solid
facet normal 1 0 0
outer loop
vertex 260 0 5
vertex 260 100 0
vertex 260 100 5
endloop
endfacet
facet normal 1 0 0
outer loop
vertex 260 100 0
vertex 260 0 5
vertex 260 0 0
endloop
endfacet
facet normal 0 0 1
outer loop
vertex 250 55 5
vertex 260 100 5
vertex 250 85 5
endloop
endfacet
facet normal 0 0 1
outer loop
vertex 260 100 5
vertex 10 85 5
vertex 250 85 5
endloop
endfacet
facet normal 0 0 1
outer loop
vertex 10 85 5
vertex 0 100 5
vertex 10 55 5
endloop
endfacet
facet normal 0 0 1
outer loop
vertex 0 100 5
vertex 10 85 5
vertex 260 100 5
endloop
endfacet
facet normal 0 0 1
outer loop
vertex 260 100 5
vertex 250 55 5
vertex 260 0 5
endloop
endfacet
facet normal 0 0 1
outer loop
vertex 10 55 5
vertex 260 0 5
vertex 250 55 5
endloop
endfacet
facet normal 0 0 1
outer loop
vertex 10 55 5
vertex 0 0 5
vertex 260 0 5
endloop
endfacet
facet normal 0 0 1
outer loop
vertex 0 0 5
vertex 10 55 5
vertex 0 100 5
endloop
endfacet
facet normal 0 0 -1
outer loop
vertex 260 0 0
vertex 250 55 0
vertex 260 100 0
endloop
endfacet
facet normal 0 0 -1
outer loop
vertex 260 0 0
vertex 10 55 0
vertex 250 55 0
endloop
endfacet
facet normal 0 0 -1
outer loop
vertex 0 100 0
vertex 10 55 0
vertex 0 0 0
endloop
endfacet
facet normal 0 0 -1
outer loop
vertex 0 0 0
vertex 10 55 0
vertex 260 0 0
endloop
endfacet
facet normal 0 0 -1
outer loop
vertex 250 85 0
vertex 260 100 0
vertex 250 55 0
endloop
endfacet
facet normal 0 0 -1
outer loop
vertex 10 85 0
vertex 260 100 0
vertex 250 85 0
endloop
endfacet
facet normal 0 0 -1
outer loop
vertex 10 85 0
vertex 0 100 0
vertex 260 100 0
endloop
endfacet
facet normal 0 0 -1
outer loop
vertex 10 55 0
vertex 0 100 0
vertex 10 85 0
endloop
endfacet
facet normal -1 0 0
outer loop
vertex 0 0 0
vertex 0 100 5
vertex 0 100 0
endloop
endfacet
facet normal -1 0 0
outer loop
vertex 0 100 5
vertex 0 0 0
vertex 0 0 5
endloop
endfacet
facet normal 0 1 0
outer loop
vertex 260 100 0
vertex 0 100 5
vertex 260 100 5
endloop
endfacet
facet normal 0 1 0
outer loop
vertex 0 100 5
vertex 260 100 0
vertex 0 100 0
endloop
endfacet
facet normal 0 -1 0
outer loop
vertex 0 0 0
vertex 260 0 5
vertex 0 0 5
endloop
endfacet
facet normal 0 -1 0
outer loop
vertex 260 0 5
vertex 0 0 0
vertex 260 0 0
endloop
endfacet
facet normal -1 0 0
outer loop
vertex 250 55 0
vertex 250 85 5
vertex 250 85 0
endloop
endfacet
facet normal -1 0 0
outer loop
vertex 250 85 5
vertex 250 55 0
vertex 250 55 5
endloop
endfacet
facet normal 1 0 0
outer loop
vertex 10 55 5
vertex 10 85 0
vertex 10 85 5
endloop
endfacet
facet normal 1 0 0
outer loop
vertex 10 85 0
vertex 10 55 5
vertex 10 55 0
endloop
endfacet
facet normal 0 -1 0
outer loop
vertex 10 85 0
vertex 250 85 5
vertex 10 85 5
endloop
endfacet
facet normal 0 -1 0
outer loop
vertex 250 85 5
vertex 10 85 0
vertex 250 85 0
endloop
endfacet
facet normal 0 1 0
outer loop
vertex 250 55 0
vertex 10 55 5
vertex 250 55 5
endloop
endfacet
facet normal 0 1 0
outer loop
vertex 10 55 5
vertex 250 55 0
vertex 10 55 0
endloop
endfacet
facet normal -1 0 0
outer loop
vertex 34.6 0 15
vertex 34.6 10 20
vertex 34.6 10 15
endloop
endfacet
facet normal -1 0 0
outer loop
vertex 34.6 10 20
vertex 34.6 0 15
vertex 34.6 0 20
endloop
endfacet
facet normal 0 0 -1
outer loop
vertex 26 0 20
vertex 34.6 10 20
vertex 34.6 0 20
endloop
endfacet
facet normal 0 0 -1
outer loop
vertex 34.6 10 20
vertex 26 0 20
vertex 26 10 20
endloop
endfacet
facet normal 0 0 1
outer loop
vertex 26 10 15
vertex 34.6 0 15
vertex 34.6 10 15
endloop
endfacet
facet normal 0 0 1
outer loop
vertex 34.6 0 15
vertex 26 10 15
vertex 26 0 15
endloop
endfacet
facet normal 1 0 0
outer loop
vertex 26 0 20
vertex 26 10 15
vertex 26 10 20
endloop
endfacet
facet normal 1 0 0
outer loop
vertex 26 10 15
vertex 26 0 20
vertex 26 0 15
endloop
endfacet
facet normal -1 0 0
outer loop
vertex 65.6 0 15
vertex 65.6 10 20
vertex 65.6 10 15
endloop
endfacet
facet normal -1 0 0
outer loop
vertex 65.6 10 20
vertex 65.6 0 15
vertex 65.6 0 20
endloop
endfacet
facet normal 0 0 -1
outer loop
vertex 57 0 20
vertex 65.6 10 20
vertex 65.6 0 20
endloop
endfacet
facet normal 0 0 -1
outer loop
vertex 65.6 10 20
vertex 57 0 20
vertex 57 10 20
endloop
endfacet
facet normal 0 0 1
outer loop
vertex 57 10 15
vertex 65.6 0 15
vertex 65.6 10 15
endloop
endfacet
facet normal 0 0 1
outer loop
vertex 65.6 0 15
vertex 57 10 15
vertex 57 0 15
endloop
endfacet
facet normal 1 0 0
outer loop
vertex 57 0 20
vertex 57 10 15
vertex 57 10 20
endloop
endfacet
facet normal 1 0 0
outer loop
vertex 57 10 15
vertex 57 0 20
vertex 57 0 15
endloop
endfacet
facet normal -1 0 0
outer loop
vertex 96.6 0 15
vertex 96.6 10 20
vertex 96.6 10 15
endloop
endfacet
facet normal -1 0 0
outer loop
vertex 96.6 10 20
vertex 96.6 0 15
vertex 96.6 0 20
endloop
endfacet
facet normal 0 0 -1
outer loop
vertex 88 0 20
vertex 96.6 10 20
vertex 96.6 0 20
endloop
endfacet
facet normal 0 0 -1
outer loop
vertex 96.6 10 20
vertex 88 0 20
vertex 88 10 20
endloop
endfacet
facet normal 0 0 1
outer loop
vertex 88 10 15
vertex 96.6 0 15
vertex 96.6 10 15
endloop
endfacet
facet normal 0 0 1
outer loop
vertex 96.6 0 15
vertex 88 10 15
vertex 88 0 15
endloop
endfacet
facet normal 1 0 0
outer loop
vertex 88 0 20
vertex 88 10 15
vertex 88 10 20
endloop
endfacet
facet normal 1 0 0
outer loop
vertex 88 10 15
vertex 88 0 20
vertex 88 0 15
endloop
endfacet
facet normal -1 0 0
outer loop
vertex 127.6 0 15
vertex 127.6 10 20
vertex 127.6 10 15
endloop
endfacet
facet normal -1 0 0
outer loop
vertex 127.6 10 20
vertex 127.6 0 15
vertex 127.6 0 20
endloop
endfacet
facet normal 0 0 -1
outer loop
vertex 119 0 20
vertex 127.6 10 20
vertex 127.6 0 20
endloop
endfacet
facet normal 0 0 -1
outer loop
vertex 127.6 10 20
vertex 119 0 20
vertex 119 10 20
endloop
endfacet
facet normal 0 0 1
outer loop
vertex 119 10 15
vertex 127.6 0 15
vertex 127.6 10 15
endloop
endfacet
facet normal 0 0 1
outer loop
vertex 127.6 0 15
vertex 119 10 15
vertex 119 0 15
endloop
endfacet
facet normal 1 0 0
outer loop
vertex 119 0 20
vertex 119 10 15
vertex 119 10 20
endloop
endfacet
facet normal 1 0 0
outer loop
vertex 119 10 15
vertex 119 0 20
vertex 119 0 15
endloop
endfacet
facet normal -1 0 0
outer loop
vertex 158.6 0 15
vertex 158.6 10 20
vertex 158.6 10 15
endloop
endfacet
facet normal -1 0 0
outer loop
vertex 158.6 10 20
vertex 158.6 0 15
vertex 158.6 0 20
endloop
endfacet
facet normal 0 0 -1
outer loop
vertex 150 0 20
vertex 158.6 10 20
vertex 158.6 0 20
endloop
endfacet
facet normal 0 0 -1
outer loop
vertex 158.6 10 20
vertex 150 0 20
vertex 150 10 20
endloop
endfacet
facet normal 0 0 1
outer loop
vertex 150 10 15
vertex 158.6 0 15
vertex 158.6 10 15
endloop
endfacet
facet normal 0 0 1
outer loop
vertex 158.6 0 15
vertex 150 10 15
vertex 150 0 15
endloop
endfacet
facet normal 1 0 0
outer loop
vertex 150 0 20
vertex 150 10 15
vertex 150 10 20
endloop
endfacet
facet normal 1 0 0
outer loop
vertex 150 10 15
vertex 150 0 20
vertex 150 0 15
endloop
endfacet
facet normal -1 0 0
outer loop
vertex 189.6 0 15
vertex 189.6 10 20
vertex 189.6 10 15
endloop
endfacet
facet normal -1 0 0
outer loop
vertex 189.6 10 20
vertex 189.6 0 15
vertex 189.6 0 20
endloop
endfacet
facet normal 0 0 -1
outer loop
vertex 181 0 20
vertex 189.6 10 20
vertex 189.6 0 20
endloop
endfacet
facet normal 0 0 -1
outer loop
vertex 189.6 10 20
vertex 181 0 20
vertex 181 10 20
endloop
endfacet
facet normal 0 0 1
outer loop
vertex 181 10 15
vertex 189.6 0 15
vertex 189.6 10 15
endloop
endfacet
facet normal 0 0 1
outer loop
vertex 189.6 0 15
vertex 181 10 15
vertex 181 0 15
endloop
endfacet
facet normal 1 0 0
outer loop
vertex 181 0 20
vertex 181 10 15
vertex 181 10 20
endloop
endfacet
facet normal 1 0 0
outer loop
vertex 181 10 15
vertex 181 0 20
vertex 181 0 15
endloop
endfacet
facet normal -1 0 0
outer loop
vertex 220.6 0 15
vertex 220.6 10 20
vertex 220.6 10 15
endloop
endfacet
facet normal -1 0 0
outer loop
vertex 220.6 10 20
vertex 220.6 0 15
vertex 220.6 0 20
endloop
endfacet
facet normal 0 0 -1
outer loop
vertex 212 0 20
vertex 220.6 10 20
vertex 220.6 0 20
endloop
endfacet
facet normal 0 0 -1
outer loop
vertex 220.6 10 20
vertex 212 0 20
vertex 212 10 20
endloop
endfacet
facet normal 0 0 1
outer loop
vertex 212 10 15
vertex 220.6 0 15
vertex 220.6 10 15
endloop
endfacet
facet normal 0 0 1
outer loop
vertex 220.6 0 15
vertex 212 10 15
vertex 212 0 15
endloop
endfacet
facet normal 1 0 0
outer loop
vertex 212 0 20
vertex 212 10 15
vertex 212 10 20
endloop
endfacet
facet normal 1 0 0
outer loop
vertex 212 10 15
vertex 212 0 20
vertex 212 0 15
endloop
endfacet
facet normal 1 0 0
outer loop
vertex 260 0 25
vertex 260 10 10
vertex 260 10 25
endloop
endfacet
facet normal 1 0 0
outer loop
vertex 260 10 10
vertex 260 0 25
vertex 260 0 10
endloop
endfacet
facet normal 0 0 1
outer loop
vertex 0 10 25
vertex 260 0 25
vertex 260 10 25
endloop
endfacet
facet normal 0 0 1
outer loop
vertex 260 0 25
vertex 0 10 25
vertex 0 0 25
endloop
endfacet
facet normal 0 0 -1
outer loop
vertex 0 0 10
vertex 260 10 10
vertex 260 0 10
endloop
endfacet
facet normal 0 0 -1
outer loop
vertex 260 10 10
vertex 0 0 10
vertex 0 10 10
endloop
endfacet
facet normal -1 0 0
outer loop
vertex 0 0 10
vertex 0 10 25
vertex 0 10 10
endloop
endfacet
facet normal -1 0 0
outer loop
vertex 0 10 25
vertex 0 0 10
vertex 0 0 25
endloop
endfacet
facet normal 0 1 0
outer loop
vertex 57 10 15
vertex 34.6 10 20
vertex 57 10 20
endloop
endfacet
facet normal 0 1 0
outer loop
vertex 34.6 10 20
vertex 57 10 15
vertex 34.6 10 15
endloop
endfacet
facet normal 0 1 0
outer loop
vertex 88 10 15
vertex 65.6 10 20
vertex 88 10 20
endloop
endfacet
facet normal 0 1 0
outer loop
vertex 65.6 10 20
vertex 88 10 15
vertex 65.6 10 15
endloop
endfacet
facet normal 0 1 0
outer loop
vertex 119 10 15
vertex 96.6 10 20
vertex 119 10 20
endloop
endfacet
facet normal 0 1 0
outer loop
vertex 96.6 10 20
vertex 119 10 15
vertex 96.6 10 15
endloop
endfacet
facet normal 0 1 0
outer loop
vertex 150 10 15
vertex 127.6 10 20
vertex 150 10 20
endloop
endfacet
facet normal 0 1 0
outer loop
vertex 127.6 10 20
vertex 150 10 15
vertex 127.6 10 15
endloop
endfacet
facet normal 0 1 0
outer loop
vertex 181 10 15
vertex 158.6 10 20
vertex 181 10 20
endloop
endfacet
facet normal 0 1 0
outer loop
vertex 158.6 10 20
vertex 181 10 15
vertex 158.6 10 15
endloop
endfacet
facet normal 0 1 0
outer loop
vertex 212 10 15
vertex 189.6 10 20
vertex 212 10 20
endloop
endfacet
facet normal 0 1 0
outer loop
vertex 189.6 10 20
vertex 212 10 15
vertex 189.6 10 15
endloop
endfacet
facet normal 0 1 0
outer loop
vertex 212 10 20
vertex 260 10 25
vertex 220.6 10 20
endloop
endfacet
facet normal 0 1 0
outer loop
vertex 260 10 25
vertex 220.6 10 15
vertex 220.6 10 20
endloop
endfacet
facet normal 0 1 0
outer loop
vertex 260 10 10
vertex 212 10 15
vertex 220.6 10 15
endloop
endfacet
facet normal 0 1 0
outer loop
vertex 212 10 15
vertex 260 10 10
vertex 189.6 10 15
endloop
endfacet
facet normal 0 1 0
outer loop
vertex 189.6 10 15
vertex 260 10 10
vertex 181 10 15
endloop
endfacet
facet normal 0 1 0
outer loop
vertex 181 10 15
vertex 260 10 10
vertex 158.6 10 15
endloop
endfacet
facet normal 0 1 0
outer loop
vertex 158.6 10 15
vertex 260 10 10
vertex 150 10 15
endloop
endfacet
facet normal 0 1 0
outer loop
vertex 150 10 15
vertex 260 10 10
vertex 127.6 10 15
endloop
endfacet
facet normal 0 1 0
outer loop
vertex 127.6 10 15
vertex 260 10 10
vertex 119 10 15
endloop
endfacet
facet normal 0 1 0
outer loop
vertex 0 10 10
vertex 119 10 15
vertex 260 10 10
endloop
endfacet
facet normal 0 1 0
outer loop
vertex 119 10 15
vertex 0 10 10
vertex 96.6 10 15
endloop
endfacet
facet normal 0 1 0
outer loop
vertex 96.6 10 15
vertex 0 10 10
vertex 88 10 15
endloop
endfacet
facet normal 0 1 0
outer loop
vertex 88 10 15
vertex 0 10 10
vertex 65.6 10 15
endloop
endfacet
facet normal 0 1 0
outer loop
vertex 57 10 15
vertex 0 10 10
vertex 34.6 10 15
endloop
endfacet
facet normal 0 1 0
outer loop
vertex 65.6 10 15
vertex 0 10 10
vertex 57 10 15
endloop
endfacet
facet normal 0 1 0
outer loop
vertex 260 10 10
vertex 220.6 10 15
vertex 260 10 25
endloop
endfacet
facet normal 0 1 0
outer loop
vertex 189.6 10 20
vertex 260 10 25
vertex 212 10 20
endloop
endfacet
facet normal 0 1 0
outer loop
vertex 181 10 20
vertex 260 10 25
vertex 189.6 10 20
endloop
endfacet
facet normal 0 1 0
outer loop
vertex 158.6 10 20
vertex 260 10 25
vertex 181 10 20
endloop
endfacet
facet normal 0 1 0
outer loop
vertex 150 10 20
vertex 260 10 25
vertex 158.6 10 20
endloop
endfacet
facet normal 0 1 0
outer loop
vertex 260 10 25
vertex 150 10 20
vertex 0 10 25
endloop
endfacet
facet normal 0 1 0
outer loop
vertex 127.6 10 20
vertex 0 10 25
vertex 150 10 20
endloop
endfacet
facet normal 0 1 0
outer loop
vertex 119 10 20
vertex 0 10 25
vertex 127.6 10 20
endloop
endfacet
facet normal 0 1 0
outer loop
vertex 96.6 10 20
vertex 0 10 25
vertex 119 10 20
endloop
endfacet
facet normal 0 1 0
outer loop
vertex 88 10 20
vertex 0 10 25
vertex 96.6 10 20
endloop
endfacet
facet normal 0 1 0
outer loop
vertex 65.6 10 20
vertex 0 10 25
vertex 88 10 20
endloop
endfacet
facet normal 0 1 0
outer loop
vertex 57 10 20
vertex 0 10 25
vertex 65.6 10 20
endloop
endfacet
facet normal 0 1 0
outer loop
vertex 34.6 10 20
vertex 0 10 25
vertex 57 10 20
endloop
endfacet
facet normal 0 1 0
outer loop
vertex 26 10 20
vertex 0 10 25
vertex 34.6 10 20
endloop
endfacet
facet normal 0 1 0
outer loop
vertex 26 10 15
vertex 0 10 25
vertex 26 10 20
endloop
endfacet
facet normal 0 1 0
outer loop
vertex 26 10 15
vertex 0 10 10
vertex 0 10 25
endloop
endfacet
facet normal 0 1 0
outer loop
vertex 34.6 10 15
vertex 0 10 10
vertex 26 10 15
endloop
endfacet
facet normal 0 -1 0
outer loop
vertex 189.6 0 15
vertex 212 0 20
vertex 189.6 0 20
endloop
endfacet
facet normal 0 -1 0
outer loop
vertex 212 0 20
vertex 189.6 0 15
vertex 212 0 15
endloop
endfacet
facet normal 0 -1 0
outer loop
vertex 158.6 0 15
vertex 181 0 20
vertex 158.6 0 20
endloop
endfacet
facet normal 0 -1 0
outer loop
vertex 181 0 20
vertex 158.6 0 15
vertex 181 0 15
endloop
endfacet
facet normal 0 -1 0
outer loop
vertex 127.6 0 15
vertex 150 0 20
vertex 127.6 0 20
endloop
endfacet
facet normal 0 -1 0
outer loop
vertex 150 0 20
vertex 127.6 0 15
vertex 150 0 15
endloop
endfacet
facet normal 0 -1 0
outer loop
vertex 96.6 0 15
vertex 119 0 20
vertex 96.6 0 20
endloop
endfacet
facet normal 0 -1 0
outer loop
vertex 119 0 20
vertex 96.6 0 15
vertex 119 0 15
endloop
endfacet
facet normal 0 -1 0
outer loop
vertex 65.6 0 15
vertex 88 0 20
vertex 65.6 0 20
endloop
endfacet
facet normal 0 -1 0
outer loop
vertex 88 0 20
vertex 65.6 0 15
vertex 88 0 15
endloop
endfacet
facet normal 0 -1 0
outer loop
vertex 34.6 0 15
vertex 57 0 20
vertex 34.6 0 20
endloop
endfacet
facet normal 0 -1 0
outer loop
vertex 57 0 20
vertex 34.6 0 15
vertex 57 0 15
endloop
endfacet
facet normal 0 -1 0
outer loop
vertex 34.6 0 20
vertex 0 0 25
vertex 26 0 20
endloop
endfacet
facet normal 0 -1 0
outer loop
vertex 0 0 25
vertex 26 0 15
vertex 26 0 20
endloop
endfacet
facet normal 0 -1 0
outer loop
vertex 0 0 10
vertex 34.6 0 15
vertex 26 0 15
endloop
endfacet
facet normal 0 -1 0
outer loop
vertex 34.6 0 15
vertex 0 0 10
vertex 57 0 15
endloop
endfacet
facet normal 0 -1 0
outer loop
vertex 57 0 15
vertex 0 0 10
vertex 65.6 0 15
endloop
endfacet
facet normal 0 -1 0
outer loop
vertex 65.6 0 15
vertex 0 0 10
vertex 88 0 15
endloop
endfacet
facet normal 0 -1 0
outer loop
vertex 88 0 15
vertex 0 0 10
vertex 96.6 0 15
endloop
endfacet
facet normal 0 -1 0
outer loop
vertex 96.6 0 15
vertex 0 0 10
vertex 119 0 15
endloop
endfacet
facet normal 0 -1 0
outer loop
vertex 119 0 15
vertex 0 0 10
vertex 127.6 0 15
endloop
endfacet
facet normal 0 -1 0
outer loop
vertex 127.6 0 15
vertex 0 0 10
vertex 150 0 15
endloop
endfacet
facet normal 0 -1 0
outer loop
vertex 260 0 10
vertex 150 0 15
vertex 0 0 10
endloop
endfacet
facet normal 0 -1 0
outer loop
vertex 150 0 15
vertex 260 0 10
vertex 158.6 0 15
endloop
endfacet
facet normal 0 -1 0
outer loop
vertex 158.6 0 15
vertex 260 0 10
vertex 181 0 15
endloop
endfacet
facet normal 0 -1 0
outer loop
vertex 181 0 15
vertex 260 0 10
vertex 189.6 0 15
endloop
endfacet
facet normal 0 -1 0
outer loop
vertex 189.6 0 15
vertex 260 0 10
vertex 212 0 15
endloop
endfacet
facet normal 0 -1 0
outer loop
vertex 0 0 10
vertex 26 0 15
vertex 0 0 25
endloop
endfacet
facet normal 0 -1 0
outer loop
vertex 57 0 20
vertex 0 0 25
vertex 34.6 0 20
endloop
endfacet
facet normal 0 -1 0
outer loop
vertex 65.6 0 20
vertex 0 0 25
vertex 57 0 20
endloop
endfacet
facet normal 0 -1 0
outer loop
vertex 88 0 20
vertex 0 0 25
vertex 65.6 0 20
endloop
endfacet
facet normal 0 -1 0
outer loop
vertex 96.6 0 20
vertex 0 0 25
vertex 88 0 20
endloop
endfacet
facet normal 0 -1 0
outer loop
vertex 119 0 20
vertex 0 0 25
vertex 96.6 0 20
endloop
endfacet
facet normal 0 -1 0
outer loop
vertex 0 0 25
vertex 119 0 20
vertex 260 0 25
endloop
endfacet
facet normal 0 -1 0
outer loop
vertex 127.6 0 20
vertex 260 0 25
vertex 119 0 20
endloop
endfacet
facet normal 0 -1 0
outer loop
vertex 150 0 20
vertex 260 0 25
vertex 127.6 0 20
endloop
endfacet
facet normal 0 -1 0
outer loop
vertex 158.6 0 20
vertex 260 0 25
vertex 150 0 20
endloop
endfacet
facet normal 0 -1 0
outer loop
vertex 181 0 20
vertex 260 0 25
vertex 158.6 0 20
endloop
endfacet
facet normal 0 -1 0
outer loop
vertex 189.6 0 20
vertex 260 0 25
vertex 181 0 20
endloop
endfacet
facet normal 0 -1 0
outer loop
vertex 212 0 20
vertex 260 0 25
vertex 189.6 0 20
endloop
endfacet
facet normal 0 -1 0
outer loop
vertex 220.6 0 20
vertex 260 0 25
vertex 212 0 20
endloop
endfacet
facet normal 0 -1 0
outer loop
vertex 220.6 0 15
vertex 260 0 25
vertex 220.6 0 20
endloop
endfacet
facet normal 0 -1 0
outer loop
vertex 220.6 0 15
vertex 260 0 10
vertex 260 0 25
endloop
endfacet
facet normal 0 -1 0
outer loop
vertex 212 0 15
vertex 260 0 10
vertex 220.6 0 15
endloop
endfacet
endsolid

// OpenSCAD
/*
 * WAVE OCEAN MECHANISM - PRINT PARTS
 *
 * Set PART_SELECT to export individual parts for printing
 */

// PART SELECTION
// 0 = Assembly view (not for printing)
// 1 = Frame base
// 2 = Slot rail
// 3 = Left side wall
// 4 = Right side wall
// 5 = Left bearing block
// 6 = Right bearing block
// 7 = Top beam
// 8 = Camshaft (print horizontally)
// 9 = Cam 1 (smallest)
// 10 = Cam 2
// 11 = Cam 3
// 12 = Cam 4 (medium)
// 13 = Cam 5
// 14 = Cam 6
// 15 = Cam 7 (largest)
// 16 = Wave segment (print 7x)
// 17 = Belt pulley
// 18 = Hand crank
PART_SELECT = 0;

// ============================================
// PARAMETERS (same as main file)
// ============================================

WAVE_AREA_START = 78;
NUM_WAVES = 7;
PHASE_OFFSET = 360 / NUM_WAVES;

WAVE_WIDTH = 36;
WAVE_OVERLAP = 5;
WAVE_SPACING = WAVE_WIDTH - WAVE_OVERLAP;
WAVE_LENGTH = 70;
WAVE_THICKNESS = 3;

TAB_WIDTH = 8;
TAB_HEIGHT = 4;

CAMSHAFT_DIA = 8;
CAMSHAFT_LENGTH = 250;
CAMSHAFT_HOLE = 8.6;
CAMSHAFT_Y = 60;
CAMSHAFT_Z = 20;

CAM_PROFILES = [
    [6, 3, 2],
    [7, 3.5, 2],
    [8, 4, 2.5],
    [10, 5, 2.5],
    [12, 6, 3],
    [14, 7, 3],
    [16, 8, 3]
];

SLOT_LENGTHS = [3, 4, 5, 6, 7, 8, 10];

FRAME_WIDTH = 260;
FRAME_DEPTH = 100;
FRAME_HEIGHT = 60;
FRAME_WALL = 5;
FRAME_X = WAVE_AREA_START - 10;
FRAME_Y = -10;
FRAME_Z = 0;

SLOT_RAIL_HEIGHT = 15;
SLOT_RAIL_Y = 0;
SLOT_RAIL_Z = 10;

BEARING_BLOCK_SIZE = 20;

CRANK_ARM_LENGTH = 35;
CRANK_KNOB_DIA = 15;
CRANK_KNOB_HEIGHT = 25;

PULLEY_OD = 30;
PULLEY_WIDTH = 8;

$fn = 64;

function wave_x(i) = WAVE_AREA_START + 20 + i * WAVE_SPACING;

// ============================================
// PRINT-ORIENTED MODULES
// ============================================

// Frame base - print flat
module print_frame_base() {
    difference() {
        cube([FRAME_WIDTH, FRAME_DEPTH, FRAME_WALL]);
        // Cutout for camshaft clearance
        translate([10, CAMSHAFT_Y - FRAME_Y - 15, -1])
            cube([FRAME_WIDTH - 20, 30, FRAME_WALL + 2]);
    }
}

// Slot rail - print flat
module print_slot_rail() {
    difference() {
        cube([FRAME_WIDTH, FRAME_WALL + 5, SLOT_RAIL_HEIGHT]);
        // Horizontal slots
        for (i = [0:NUM_WAVES-1]) {
            slot_x = wave_x(i) - FRAME_X - TAB_WIDTH/2;
            translate([slot_x, -1, SLOT_RAIL_HEIGHT/2 - TAB_HEIGHT/2 - 0.5])
                cube([TAB_WIDTH + 0.6, FRAME_WALL + 7, TAB_HEIGHT + 1]);
        }
    }
}

// Side wall - print flat
module print_side_wall() {
    cube([FRAME_WALL, FRAME_DEPTH, FRAME_HEIGHT]);
}

// Bearing block - print flat
module print_bearing_block() {
    difference() {
        cube([FRAME_WALL + 5, BEARING_BLOCK_SIZE, BEARING_BLOCK_SIZE]);
        translate([-1, BEARING_BLOCK_SIZE/2, BEARING_BLOCK_SIZE/2])
            rotate([0, 90, 0])
                cylinder(d=CAMSHAFT_HOLE, h=FRAME_WALL + 7);
    }
}

// Top beam - print flat
module print_top_beam() {
    cube([FRAME_WIDTH, 15, FRAME_WALL]);
}

// Camshaft - print horizontally
module print_camshaft() {
    rotate([0, 90, 0])
        cylinder(d=CAMSHAFT_DIA, h=CAMSHAFT_LENGTH);
}

// Elliptical cam - print flat
module print_cam(cam_num) {
    major = CAM_PROFILES[cam_num][0];
    minor = CAM_PROFILES[cam_num][1];
    groove_depth = CAM_PROFILES[cam_num][2];
    width = WAVE_WIDTH - 2;

    difference() {
        // Main elliptical body
        scale([major/10, minor/10, 1])
            cylinder(r=10, h=width);
        // Groove channel
        translate([0, 0, 2])
            scale([(major-groove_depth)/10, (minor-groove_depth)/10, 1])
                cylinder(r=10, h=width-4);
        // Shaft hole with keyway
        translate([0, 0, -1])
            cylinder(d=CAMSHAFT_DIA+0.3, h=width+2);
        // Keyway
        translate([-1, CAMSHAFT_DIA/2 - 0.5, -1])
            cube([2, 2, width+2]);
    }
}

// Wave segment - print flat
module print_wave_segment() {
    // Main body
    cube([WAVE_WIDTH, WAVE_LENGTH, WAVE_THICKNESS]);
    // Tab
    translate([WAVE_WIDTH/2 - TAB_WIDTH/2, -5, WAVE_THICKNESS/2 - TAB_HEIGHT/2])
        cube([TAB_WIDTH, 8, TAB_HEIGHT]);
    // Follower pin mounting holes
    translate([5, WAVE_LENGTH - 5, -1])
        cylinder(d=4.3, h=WAVE_THICKNESS + 2);
    translate([WAVE_WIDTH - 5, WAVE_LENGTH - 5, -1])
        cylinder(d=4.3, h=WAVE_THICKNESS + 2);
}

// Belt pulley - print standing
module print_belt_pulley() {
    difference() {
        union() {
            cylinder(d=PULLEY_OD, h=PULLEY_WIDTH);
            cylinder(d=PULLEY_OD + 4, h=1);
            translate([0, 0, PULLEY_WIDTH - 1])
                cylinder(d=PULLEY_OD + 4, h=1);
        }
        translate([0, 0, -1])
            cylinder(d=CAMSHAFT_HOLE, h=PULLEY_WIDTH + 2);
    }
}

// Hand crank - print flat
module print_hand_crank() {
    // Hub
    difference() {
        cylinder(d=20, h=8);
        translate([0, 0, -1])
            cylinder(d=CAMSHAFT_DIA + 0.3, h=10);
    }
    // Arm
    translate([0, -5, 0])
        cube([CRANK_ARM_LENGTH, 10, 8]);
    // Knob
    translate([CRANK_ARM_LENGTH, 0, 0])
        cylinder(d=CRANK_KNOB_DIA, h=CRANK_KNOB_HEIGHT);
}

// ============================================
// PART SELECTION
// ============================================

if (PART_SELECT == 0) {
    echo("Assembly view - not for printing. Set PART_SELECT 1-18.");

    // Quick assembly preview
    color([0.3, 0.3, 0.35]) {
        print_frame_base();
        translate([0, 0, SLOT_RAIL_Z])
            print_slot_rail();
    }
}
else if (PART_SELECT == 1) {
    echo("Part 1: Frame Base - 260×100×5mm");
    print_frame_base();
}
else if (PART_SELECT == 2) {
    echo("Part 2: Slot Rail - 260×10×15mm with 7 slots");
    print_slot_rail();
}
else if (PART_SELECT == 3) {
    echo("Part 3: Left Side Wall - 5×100×60mm");
    print_side_wall();
}
else if (PART_SELECT == 4) {
    echo("Part 4: Right Side Wall - 5×100×60mm");
    print_side_wall();
}
else if (PART_SELECT == 5) {
    echo("Part 5: Left Bearing Block - 10×20×20mm");
    print_bearing_block();
}
else if (PART_SELECT == 6) {
    echo("Part 6: Right Bearing Block - 10×20×20mm");
    print_bearing_block();
}
else if (PART_SELECT == 7) {
    echo("Part 7: Top Beam - 260×15×5mm");
    print_top_beam();
}
else if (PART_SELECT == 8) {
    echo("Part 8: Camshaft - 8mm dia × 250mm (print with supports)");
    print_camshaft();
}
else if (PART_SELECT == 9) {
    echo("Part 9: Cam 1 (smallest) - 12×6mm ellipse");
    print_cam(0);
}
else if (PART_SELECT == 10) {
    echo("Part 10: Cam 2 - 14×7mm ellipse");
    print_cam(1);
}
else if (PART_SELECT == 11) {
    echo("Part 11: Cam 3 - 16×8mm ellipse");
    print_cam(2);
}
else if (PART_SELECT == 12) {
    echo("Part 12: Cam 4 (medium) - 20×10mm ellipse");
    print_cam(3);
}
else if (PART_SELECT == 13) {
    echo("Part 13: Cam 5 - 24×12mm ellipse");
    print_cam(4);
}
else if (PART_SELECT == 14) {
    echo("Part 14: Cam 6 - 28×14mm ellipse");
    print_cam(5);
}
else if (PART_SELECT == 15) {
    echo("Part 15: Cam 7 (largest) - 32×16mm ellipse");
    print_cam(6);
}
else if (PART_SELECT == 16) {
    echo("Part 16: Wave Segment - 36×70×3mm (PRINT 7x)");
    print_wave_segment();
}
else if (PART_SELECT == 17) {
    echo("Part 17: Belt Pulley - 30mm OD × 8mm");
    print_belt_pulley();
}
else if (PART_SELECT == 18) {
    echo("Part 18: Hand Crank");
    print_hand_crank();
}

// ============================================
// BOM ECHO
// ============================================

echo("");
echo("=== BILL OF MATERIALS ===");
echo("");
echo("PRINTED PARTS:");
echo("  1× Frame Base (260×100×5mm)");
echo("  1× Slot Rail (260×10×15mm)");
echo("  2× Side Walls (5×100×60mm)");
echo("  2× Bearing Blocks (10×20×20mm)");
echo("  1× Top Beam (260×15×5mm)");
echo("  1× Camshaft (8mm × 250mm)");
echo("  7× Cams (progressive sizes)");
echo("  7× Wave Segments (36×70×3mm)");
echo("  1× Belt Pulley (30mm)");
echo("  1× Hand Crank");
echo("");
echo("HARDWARE:");
echo("  14× M3×8 screws (frame assembly)");
echo("  14× M3 nuts");
echo("  7× 4mm × 30mm pins (cam followers)");
echo("");
echo("Total printed parts: 24");
echo("Estimated print time: 8-10 hours");
